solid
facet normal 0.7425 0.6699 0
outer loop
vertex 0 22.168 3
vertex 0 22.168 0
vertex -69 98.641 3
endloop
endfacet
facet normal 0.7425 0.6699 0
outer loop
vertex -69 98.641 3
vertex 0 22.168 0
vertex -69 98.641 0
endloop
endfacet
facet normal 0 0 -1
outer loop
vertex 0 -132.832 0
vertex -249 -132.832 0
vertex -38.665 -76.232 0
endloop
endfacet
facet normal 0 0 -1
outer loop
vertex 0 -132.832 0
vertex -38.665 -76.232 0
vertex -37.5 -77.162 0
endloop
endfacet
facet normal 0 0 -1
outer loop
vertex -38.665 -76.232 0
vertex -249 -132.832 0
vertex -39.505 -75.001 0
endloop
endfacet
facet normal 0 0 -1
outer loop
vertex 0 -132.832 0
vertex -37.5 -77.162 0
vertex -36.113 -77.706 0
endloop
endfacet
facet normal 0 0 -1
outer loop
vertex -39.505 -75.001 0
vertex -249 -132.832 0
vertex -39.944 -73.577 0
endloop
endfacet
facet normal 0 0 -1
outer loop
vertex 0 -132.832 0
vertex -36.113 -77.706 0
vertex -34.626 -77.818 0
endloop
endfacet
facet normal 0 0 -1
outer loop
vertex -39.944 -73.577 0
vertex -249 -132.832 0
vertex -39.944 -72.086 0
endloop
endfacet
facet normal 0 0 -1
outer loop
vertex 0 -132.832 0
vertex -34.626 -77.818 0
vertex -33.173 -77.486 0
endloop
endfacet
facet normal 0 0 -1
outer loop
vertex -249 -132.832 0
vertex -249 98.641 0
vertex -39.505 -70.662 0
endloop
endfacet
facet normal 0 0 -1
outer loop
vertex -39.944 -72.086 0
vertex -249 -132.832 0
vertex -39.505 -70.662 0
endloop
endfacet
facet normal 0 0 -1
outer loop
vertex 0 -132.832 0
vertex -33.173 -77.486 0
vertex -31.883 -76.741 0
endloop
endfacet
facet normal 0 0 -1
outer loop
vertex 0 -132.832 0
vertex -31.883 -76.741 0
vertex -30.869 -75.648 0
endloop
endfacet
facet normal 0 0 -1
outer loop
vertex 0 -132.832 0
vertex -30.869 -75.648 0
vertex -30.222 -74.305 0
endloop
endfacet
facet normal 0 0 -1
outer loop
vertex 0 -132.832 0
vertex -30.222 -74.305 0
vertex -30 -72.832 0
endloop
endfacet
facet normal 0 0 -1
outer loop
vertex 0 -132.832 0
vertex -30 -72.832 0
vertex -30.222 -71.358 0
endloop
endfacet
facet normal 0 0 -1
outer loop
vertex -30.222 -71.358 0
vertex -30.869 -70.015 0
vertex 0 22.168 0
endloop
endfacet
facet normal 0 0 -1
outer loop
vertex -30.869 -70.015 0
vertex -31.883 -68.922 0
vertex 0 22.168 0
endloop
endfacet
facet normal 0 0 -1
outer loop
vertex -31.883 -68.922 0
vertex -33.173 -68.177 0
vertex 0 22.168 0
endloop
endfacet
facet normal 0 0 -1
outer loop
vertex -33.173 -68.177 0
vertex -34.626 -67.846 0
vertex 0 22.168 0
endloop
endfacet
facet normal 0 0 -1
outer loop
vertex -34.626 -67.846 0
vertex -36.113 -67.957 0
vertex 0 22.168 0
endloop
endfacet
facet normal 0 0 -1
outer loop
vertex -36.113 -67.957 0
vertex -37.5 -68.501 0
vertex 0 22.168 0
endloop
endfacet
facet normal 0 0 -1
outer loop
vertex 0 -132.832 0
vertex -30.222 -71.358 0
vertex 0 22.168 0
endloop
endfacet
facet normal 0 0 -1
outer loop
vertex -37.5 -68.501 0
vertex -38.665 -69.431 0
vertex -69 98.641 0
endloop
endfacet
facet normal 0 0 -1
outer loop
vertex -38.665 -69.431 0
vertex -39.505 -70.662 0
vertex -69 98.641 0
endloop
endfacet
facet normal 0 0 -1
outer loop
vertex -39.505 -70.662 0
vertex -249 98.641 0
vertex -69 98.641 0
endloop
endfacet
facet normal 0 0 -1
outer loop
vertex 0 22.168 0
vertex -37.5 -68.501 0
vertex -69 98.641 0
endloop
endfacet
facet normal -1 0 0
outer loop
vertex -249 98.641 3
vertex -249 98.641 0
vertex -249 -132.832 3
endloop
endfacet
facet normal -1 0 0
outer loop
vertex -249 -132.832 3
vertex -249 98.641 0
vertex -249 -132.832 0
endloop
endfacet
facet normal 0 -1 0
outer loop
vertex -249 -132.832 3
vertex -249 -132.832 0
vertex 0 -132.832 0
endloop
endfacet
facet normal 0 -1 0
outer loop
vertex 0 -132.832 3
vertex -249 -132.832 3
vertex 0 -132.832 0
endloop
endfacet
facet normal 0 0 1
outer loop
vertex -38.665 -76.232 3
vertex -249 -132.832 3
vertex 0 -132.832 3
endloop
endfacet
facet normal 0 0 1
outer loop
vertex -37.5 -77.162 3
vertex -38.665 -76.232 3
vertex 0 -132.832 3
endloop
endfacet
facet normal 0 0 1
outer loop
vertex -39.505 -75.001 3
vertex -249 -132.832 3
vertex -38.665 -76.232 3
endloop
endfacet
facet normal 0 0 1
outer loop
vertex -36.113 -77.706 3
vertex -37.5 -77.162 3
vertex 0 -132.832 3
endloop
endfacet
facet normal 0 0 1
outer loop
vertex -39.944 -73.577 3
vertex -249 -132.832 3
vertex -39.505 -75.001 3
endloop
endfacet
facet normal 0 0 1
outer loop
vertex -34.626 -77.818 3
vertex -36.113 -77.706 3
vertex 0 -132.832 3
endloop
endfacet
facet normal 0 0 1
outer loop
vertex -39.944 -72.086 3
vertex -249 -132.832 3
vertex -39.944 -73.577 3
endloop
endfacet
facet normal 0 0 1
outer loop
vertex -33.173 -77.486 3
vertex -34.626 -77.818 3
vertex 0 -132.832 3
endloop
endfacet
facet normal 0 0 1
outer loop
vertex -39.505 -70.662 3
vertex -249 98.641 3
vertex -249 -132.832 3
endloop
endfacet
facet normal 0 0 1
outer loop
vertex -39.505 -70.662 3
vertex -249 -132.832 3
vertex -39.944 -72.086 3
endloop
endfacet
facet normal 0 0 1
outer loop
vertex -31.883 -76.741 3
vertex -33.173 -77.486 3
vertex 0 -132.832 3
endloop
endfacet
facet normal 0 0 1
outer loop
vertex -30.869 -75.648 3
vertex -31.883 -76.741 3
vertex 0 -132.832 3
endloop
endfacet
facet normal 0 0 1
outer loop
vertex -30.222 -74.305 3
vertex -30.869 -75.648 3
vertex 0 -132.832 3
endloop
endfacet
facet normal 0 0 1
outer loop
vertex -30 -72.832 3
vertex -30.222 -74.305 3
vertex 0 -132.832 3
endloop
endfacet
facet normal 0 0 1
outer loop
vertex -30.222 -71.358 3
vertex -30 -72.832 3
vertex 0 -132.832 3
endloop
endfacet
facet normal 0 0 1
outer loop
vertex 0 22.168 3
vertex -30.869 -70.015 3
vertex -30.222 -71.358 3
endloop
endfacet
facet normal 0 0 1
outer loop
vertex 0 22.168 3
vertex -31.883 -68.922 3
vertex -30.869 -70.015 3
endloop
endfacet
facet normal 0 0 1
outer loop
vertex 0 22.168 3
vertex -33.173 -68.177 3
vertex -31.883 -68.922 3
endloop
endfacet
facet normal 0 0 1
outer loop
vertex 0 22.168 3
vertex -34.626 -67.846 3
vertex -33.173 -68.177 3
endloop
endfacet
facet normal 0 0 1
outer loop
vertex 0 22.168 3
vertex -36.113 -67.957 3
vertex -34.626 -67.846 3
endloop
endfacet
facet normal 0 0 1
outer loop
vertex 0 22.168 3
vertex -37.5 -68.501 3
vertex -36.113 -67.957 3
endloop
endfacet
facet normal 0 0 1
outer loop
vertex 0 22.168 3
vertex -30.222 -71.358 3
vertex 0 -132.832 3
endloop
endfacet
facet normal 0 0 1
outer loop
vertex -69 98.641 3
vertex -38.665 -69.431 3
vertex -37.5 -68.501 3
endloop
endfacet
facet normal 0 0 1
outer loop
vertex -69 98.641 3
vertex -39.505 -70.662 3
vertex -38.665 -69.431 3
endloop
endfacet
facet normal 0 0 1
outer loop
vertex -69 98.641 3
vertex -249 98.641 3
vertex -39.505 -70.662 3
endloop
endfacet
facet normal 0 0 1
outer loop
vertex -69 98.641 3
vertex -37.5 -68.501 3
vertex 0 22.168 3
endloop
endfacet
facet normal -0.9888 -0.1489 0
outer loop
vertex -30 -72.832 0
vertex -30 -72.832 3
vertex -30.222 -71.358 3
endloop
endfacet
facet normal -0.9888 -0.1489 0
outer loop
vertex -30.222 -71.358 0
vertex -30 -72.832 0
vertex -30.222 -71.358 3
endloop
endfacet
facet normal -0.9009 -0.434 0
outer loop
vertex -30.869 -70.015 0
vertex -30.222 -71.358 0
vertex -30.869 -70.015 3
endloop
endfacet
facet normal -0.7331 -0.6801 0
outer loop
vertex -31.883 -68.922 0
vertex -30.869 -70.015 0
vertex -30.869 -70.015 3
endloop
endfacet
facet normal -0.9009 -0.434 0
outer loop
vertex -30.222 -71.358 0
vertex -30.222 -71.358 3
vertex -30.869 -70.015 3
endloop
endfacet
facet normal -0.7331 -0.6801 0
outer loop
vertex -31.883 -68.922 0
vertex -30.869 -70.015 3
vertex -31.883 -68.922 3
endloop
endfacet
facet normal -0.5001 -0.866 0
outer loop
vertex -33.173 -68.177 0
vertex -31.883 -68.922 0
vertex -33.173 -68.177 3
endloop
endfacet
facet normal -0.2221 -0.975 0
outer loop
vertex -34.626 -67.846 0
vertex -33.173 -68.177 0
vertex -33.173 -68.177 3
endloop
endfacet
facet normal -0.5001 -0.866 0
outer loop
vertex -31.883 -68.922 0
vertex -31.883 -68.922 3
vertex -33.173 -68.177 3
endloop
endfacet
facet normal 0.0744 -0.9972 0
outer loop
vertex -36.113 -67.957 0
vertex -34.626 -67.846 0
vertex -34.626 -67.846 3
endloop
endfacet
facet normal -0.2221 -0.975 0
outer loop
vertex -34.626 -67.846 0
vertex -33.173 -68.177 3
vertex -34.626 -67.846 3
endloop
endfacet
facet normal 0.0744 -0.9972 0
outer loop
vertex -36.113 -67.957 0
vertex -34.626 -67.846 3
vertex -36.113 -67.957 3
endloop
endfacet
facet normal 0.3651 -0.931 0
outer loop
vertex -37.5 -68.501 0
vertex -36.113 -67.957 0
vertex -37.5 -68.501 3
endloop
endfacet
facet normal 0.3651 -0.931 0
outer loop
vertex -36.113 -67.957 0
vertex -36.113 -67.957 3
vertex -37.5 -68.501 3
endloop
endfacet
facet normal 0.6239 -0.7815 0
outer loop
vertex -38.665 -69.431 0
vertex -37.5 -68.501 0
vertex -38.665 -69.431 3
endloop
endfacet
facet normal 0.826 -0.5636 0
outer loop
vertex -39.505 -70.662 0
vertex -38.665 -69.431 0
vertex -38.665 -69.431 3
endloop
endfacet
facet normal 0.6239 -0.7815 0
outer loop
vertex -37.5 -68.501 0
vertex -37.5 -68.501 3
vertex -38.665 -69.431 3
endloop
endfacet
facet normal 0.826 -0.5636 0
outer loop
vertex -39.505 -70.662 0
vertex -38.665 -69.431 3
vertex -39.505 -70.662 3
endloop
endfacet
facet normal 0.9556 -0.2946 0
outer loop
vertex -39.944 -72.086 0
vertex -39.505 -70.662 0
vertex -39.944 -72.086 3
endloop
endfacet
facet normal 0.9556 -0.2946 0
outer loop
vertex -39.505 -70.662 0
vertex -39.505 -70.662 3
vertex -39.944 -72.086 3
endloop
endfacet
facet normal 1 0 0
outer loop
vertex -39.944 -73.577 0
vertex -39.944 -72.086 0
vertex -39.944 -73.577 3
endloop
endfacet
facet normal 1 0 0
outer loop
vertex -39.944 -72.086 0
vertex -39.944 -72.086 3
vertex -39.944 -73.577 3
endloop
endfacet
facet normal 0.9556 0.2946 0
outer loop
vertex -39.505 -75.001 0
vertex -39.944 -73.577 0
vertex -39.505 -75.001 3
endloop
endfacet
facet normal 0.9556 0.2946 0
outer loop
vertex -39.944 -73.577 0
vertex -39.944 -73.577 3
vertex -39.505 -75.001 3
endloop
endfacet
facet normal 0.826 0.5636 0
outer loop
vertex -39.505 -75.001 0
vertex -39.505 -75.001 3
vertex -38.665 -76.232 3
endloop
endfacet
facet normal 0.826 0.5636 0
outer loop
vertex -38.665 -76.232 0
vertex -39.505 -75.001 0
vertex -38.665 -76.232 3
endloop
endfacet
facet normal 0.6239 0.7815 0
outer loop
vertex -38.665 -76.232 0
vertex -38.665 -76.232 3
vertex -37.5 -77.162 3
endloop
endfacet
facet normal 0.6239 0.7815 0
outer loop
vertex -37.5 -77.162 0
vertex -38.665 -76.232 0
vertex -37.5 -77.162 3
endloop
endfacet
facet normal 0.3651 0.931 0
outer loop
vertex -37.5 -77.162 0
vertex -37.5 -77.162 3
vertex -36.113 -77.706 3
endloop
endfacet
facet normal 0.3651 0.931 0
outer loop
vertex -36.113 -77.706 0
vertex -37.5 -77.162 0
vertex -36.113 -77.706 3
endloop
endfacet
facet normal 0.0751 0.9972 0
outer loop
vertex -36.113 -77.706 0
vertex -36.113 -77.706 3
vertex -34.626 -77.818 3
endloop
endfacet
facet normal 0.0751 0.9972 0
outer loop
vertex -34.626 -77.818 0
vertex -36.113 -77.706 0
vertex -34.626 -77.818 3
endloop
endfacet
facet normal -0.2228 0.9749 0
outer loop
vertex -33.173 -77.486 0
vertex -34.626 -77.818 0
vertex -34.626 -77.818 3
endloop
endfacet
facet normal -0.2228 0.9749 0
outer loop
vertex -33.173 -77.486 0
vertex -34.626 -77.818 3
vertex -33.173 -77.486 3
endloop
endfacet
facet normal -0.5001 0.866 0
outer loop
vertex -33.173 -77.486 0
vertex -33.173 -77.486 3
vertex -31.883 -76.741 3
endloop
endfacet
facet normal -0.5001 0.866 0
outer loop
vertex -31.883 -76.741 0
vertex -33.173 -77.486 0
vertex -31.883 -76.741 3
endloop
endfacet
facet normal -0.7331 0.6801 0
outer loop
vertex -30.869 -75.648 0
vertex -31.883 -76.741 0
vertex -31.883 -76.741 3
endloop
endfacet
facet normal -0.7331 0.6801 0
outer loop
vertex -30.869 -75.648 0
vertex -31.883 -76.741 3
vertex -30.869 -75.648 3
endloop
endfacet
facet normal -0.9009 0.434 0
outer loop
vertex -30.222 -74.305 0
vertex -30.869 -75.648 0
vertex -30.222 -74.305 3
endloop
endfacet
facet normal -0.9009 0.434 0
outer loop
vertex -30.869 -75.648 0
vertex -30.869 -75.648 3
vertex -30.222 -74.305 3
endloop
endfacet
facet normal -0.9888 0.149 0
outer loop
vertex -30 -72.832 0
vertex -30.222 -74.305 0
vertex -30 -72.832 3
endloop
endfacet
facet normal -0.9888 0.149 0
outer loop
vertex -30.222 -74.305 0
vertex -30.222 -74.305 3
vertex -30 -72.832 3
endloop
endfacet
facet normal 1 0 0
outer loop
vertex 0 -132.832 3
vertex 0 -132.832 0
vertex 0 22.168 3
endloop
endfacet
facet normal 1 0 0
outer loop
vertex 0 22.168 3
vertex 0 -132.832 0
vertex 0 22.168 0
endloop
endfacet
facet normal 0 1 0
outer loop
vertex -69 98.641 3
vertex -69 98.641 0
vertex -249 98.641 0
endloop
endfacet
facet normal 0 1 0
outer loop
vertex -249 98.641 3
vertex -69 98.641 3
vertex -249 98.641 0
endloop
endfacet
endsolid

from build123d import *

# Parameters (mm, degrees)
F1_DEPTH = 3
F2_R     = 5
F3_DEPTH = 3


with BuildPart() as f1:
    # F0 (on Top) → F1 (new body)
    with BuildSketch(Plane.XY):
        Polygon((-69, 98.640618), (-249, 98.640618), (-249, -132.831599), (0, -132.831599), (0, 22.168401), align=None)
    extrude(amount=F1_DEPTH)

    # F2 (on face) → F3 (cut)
    with BuildSketch(Plane.XY.offset(3)):
        with Locations((-35, -72.831599)):
            Circle(F2_R)
    extrude(amount=-F3_DEPTH, mode=Mode.SUBTRACT)


solid = f1.part
